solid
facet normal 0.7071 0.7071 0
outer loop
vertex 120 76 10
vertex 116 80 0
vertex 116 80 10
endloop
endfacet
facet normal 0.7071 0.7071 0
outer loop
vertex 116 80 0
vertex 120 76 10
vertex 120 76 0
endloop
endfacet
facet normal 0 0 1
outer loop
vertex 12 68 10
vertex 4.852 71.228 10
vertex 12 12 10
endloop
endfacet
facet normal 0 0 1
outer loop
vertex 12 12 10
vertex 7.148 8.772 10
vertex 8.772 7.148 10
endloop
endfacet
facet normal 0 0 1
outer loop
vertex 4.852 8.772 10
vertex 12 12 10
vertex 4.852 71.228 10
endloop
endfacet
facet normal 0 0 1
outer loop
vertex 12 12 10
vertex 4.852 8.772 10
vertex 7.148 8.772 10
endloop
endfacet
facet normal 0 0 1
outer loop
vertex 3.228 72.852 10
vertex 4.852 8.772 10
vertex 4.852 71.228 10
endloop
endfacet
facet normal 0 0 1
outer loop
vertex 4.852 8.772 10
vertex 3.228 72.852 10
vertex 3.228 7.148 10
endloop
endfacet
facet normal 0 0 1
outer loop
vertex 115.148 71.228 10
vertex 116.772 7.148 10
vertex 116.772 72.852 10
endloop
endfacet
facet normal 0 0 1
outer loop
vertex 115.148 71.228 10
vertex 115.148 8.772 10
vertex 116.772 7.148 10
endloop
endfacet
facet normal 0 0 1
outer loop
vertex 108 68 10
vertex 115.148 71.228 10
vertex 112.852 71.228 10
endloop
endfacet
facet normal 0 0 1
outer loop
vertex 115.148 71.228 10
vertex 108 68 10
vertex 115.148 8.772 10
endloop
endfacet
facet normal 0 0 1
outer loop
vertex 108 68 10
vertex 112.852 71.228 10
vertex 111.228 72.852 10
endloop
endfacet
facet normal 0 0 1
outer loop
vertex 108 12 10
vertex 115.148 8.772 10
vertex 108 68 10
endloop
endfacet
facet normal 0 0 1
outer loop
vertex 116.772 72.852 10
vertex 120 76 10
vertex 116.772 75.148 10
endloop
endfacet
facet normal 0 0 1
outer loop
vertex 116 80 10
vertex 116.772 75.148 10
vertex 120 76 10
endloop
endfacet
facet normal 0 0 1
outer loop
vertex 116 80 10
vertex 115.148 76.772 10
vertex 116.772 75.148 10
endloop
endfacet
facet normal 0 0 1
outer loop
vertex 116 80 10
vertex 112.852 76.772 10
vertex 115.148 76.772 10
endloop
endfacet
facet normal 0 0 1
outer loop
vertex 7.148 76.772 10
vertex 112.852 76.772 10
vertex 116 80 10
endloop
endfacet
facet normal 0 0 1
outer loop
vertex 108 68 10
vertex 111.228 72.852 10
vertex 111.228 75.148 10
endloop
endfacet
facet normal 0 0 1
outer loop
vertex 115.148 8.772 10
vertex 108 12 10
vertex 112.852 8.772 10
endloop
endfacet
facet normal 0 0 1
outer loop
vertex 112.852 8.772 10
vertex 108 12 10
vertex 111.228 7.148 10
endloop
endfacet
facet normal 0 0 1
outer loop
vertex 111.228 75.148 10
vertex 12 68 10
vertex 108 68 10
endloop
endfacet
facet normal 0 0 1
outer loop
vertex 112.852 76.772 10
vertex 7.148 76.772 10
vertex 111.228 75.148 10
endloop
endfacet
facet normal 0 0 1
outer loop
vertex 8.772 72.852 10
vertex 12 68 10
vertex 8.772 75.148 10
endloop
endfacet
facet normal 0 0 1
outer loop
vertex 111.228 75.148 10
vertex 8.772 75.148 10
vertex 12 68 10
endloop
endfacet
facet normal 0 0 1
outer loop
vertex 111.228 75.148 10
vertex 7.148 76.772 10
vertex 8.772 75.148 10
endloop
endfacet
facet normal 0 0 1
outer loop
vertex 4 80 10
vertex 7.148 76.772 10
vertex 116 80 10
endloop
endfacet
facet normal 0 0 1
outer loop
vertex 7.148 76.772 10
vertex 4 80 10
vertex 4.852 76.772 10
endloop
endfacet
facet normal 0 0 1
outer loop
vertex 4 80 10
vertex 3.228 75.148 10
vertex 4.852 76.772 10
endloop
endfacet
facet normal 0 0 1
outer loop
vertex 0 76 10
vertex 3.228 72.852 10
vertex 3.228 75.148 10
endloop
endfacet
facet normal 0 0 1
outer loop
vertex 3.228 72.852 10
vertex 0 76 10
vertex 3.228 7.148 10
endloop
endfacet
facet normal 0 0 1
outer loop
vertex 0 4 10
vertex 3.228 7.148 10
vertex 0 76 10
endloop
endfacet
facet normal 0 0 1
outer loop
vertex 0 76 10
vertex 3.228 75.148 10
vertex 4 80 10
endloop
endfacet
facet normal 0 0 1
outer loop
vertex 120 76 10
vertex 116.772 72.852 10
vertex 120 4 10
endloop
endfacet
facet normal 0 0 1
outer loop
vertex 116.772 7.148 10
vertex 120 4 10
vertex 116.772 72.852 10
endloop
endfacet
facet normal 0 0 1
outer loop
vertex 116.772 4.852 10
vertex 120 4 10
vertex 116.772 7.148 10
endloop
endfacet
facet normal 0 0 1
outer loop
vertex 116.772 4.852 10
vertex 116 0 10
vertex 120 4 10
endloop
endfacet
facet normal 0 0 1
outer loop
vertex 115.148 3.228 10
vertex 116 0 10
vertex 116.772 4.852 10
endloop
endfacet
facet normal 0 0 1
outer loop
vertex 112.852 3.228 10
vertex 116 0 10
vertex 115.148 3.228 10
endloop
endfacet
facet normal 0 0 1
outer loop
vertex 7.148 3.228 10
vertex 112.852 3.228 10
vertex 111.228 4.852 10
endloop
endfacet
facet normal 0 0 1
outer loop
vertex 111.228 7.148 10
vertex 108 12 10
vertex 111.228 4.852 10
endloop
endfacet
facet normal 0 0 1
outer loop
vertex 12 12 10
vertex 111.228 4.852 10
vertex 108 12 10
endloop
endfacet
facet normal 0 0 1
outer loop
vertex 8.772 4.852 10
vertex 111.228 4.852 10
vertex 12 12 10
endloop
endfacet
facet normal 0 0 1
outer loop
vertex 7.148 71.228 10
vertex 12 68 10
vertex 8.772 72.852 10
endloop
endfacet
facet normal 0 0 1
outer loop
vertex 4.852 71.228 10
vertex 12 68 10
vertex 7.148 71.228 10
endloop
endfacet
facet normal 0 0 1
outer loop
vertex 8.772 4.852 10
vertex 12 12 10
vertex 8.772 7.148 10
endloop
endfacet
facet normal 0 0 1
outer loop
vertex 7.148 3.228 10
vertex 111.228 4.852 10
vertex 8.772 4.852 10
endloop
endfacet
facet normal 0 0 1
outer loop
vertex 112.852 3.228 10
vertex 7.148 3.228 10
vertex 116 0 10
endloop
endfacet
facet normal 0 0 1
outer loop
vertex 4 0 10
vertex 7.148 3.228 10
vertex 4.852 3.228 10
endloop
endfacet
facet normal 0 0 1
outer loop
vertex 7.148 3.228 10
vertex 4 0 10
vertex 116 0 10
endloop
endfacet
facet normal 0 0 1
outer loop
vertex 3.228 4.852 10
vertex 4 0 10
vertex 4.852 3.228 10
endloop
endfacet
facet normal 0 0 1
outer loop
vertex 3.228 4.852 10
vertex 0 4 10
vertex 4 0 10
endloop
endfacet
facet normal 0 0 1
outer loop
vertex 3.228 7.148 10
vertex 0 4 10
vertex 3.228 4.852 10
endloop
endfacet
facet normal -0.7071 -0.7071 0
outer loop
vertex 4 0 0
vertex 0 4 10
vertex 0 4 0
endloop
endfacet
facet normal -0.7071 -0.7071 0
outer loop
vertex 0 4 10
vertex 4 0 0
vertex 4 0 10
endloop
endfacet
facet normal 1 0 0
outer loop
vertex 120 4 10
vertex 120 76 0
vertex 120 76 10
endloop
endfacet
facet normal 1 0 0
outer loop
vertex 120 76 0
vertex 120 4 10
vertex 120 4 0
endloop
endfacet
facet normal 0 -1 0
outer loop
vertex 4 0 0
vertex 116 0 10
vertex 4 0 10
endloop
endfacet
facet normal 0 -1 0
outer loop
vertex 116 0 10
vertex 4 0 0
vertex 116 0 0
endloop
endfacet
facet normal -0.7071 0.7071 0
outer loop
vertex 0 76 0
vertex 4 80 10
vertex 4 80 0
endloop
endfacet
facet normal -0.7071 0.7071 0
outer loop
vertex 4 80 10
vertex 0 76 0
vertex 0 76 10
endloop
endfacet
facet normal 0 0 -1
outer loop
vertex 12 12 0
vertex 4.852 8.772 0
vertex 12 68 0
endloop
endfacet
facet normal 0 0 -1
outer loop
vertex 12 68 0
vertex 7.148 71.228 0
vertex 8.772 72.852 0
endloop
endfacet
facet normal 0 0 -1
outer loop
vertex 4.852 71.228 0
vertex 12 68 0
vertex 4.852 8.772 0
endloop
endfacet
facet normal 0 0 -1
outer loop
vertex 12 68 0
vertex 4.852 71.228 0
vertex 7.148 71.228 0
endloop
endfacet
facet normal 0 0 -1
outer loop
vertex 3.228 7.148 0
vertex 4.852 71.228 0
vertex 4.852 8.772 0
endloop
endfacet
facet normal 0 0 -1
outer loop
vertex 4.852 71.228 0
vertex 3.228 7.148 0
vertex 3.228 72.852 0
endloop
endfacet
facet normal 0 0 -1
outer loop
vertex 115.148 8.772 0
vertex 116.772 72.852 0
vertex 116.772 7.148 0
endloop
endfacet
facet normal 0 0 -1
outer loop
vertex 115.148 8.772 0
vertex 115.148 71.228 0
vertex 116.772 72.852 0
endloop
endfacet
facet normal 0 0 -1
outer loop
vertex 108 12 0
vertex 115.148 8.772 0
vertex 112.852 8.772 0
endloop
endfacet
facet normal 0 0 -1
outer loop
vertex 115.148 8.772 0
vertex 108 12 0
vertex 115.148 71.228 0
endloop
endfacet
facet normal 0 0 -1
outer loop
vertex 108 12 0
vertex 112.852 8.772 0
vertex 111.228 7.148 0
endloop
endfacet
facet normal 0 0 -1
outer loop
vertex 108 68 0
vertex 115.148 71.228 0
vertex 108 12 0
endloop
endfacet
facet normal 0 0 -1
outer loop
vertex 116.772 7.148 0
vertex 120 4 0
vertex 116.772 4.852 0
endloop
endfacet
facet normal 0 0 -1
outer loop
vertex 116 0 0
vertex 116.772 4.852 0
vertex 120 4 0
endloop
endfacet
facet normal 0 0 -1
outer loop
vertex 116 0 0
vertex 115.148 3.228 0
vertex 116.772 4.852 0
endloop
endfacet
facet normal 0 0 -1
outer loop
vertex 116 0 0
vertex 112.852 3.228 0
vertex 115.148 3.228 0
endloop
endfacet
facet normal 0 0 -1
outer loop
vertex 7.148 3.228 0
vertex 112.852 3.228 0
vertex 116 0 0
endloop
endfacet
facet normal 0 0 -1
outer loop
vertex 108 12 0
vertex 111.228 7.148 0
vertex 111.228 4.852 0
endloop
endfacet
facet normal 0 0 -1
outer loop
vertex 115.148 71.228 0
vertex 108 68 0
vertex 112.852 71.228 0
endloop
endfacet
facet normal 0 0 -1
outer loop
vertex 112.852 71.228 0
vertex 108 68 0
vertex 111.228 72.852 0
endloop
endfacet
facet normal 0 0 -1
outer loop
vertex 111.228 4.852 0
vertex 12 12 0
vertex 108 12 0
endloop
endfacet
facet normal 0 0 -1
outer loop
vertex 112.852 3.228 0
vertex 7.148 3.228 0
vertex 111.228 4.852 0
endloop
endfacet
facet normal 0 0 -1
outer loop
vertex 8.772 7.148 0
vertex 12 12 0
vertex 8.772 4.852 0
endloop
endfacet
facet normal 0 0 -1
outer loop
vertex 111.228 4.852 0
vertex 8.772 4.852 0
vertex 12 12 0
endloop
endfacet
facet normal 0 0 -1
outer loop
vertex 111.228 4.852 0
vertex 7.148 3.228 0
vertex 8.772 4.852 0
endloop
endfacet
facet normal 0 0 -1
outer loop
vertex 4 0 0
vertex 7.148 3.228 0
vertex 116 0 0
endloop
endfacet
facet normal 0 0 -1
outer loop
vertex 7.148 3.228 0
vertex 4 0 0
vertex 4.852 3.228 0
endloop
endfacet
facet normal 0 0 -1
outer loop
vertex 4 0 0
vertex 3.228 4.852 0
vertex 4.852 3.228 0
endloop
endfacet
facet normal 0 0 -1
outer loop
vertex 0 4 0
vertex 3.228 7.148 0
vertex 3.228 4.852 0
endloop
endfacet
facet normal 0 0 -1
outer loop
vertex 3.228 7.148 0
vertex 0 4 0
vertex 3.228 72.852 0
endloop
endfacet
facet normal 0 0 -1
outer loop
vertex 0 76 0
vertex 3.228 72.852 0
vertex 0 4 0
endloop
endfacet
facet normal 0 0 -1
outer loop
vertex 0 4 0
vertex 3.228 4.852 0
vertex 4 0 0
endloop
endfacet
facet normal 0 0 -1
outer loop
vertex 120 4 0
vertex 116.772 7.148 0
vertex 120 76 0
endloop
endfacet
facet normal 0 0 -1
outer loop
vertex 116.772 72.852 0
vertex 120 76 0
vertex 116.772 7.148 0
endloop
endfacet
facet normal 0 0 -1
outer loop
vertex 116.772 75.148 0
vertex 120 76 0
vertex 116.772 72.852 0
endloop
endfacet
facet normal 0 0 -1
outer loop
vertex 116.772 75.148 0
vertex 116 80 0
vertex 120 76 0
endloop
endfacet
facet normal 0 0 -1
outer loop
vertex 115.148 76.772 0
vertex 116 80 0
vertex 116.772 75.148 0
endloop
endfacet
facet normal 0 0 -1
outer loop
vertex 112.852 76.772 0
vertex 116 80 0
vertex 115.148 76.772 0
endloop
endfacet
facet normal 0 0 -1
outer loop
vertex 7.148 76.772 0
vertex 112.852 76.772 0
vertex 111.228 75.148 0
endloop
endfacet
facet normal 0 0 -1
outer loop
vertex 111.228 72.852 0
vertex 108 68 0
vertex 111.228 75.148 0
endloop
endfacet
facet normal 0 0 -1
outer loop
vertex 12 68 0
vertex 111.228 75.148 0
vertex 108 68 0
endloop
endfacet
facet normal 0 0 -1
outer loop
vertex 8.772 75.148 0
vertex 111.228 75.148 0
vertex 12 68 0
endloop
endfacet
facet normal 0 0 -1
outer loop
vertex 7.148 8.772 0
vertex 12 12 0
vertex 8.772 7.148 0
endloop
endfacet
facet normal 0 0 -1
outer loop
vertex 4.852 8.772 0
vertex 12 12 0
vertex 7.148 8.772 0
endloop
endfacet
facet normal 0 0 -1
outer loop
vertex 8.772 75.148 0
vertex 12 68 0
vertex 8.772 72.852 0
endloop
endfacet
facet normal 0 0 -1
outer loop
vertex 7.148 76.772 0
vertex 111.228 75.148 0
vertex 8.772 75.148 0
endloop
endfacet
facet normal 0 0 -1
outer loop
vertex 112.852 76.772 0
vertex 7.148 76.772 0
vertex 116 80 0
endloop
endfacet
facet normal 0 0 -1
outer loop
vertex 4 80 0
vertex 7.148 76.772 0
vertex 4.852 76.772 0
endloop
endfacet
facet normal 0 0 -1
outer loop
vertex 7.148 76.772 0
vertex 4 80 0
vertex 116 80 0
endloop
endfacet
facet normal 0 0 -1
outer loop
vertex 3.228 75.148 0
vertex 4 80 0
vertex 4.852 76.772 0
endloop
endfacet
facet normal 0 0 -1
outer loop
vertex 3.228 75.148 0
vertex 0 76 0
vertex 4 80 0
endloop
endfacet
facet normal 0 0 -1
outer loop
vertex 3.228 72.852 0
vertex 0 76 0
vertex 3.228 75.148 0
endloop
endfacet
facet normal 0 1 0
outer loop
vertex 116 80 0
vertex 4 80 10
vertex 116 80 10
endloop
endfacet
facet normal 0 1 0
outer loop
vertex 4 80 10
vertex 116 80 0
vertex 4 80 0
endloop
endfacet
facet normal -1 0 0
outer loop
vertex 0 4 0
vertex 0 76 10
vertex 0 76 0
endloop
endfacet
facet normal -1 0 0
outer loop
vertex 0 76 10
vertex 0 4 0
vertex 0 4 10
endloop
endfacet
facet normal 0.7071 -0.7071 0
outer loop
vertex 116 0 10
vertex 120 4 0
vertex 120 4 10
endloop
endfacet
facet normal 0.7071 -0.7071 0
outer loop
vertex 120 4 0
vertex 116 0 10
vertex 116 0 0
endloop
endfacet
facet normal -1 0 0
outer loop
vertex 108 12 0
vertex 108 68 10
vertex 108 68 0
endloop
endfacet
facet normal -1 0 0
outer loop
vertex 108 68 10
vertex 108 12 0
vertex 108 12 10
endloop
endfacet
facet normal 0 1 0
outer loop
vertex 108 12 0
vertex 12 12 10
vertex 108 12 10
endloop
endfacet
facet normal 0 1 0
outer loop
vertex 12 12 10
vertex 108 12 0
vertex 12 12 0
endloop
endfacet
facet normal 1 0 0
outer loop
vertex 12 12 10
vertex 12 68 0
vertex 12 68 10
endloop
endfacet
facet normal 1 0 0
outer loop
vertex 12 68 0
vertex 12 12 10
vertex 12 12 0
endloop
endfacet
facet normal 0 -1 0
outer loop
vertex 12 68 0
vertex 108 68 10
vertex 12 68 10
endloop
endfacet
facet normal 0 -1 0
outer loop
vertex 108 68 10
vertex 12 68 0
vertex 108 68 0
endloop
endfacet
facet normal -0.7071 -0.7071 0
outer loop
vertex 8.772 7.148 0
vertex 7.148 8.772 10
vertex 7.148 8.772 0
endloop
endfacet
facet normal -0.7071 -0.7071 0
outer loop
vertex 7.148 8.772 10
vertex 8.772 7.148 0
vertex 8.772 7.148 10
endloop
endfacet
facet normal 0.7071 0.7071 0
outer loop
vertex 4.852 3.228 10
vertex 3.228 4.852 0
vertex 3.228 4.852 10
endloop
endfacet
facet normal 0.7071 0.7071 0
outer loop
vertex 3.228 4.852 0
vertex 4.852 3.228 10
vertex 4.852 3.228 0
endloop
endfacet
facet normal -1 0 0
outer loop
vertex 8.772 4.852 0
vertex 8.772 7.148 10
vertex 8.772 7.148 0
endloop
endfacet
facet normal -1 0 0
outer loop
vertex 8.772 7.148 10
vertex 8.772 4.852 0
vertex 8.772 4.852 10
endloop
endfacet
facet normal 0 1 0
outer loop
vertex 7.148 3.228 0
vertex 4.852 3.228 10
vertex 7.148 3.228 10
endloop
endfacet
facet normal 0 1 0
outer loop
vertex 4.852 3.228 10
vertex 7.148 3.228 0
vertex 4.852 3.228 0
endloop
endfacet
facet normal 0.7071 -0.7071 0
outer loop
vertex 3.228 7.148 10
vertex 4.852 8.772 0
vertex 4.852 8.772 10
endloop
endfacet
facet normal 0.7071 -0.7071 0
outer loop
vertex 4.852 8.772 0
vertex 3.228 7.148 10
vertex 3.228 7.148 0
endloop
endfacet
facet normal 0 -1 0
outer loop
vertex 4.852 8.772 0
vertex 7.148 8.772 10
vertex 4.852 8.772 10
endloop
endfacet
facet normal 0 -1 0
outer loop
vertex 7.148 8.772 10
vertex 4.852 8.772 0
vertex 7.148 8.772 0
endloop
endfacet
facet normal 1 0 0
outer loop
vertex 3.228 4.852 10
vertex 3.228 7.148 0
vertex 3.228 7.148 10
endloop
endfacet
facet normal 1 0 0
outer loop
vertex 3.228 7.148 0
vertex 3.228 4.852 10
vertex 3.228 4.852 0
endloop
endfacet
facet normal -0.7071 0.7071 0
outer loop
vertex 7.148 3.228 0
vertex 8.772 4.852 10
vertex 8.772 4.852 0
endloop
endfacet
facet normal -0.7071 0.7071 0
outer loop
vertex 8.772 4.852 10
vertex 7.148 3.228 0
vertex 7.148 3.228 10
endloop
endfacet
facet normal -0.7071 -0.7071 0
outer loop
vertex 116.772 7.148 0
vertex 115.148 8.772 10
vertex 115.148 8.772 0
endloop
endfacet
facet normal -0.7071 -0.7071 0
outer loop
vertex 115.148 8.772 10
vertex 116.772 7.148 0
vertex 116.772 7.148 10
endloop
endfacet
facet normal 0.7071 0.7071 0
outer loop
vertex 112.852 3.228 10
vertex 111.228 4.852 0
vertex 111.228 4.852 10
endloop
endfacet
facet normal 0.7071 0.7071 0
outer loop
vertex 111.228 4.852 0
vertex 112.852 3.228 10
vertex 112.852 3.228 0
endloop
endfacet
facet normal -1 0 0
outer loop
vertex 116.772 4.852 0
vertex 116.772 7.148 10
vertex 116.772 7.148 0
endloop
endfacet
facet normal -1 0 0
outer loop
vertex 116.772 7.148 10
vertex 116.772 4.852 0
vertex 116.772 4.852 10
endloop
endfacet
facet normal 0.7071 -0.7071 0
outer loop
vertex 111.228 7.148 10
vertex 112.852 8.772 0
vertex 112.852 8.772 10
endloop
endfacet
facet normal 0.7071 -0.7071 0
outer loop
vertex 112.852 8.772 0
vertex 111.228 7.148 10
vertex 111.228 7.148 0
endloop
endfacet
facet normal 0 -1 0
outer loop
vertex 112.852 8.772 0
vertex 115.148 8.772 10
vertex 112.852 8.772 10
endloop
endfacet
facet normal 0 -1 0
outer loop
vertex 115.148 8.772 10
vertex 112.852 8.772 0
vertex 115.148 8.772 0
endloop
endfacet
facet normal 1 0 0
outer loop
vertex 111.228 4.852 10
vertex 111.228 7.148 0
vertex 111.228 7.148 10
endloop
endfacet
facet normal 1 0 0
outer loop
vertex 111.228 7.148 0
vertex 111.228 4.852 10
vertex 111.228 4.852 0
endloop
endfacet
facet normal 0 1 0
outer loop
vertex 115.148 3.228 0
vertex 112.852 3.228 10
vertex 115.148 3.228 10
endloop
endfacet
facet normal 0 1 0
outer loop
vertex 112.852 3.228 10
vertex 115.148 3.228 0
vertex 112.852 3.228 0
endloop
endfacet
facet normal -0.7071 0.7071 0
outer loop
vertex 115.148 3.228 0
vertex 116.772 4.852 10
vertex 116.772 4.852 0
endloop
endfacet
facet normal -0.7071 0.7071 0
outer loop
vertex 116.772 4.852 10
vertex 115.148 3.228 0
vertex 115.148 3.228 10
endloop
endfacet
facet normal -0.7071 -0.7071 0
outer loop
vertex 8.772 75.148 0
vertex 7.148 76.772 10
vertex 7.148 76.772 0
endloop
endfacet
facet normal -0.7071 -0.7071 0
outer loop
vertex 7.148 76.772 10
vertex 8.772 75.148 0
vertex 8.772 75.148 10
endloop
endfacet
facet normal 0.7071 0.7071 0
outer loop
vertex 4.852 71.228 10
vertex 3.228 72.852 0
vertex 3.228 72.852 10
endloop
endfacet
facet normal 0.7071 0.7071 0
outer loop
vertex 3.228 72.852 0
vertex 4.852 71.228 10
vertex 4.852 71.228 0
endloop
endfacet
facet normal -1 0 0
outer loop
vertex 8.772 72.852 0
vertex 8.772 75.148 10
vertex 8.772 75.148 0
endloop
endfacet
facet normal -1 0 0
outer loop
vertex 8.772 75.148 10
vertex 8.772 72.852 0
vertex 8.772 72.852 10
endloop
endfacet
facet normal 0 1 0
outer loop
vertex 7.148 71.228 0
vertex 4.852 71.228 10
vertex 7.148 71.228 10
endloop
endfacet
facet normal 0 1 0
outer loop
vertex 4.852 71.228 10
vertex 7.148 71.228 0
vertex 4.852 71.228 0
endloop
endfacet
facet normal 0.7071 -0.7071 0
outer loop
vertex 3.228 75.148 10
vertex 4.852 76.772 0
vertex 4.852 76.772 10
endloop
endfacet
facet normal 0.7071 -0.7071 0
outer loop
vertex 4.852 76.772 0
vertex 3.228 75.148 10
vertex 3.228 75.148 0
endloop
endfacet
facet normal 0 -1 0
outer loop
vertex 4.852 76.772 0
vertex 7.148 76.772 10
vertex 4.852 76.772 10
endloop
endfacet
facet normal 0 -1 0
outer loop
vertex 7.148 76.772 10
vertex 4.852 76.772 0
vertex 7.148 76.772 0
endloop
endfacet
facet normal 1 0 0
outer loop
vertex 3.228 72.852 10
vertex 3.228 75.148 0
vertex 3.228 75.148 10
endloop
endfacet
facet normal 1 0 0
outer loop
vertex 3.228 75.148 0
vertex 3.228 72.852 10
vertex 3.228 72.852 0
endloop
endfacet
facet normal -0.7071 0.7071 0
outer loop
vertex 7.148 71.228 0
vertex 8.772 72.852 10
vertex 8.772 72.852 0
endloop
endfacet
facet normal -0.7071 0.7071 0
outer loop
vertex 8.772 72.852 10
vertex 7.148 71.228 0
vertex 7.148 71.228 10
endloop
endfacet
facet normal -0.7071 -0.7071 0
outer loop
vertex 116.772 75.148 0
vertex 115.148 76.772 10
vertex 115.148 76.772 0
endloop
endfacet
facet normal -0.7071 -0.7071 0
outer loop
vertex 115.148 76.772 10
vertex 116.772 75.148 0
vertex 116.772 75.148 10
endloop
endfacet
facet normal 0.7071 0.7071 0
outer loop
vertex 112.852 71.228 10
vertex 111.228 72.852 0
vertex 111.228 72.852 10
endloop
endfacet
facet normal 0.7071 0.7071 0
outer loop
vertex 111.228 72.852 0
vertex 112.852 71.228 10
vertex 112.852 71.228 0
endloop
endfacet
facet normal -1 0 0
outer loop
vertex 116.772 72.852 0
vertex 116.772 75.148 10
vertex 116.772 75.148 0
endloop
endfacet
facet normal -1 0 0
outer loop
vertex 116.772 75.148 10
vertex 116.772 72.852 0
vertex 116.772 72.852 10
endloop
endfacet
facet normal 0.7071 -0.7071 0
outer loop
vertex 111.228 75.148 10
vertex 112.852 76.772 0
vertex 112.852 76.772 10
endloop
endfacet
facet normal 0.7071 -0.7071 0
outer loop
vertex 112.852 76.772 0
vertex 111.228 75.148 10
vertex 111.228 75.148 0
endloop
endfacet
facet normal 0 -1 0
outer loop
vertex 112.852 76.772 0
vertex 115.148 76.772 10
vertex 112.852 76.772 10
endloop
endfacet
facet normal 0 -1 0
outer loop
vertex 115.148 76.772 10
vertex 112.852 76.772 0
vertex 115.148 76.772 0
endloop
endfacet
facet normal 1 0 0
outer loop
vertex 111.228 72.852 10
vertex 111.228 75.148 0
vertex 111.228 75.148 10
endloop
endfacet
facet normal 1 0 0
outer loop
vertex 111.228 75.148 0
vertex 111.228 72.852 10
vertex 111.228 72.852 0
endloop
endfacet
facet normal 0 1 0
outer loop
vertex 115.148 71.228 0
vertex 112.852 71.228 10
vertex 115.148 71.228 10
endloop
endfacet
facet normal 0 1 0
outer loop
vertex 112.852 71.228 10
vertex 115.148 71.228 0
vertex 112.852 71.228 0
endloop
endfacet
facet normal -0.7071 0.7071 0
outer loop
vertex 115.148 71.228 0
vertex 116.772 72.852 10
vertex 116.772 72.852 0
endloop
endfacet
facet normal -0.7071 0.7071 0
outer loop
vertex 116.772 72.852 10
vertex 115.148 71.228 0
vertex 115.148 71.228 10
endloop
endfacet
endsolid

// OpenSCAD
$fn = 32;

// ----------------------------------------------------------------------
// Frame plate: 120 x 80 frame, 12 mm rails
// ----------------------------------------------------------------------

// --- parameters (mm) ---
plate_l = 120;            // plate length, X
plate_w = 80;             // plate width, Y
plate_t = 10;             // plate thickness, Z (extrusion height)
corner_c = 4;             // corner chamfer
frame_bar = 12;           // frame rail width
bolt_r = 3;               // corner bolt window radius
bolt_inset = 6;           // bolt centre inset from the edges

win_l = plate_l - 2 * frame_bar;  // window length
win_w = plate_w - 2 * frame_bar;  // window width
bolt_d = 2 * bolt_r;  // corner hole diameter

profile = [[4, 0], [116, 0], [120, 4], [120, 76], [116, 80], [4, 80], [0, 76], [0, 4]];  // primary outline, 8 points, counter clockwise
void_1 = [[12, 12], [108, 12], [108, 68], [12, 68]];  // the window, 4 points
void_2 = [[8.772, 7.148], [7.148, 8.772], [4.852, 8.772], [3.228, 7.148], [3.228, 4.852], [4.852, 3.228], [7.148, 3.228], [8.772, 4.852]];  // corner bolt window, 8 points
void_3 = [[116.772, 7.148], [115.148, 8.772], [112.852, 8.772], [111.228, 7.148], [111.228, 4.852], [112.852, 3.228], [115.148, 3.228], [116.772, 4.852]];  // corner bolt window, 8 points
void_4 = [[8.772, 75.148], [7.148, 76.772], [4.852, 76.772], [3.228, 75.148], [3.228, 72.852], [4.852, 71.228], [7.148, 71.228], [8.772, 72.852]];  // corner bolt window, 8 points
void_5 = [[116.772, 75.148], [115.148, 76.772], [112.852, 76.772], [111.228, 75.148], [111.228, 72.852], [112.852, 71.228], [115.148, 71.228], [116.772, 72.852]];  // corner bolt window, 8 points

// --- the one profile operation ---
difference() {
  linear_extrude(height = plate_t) polygon(points = profile);
  translate([0, 0, -1])
    linear_extrude(height = plate_t + 2) polygon(points = void_1);
  translate([0, 0, -1])
    linear_extrude(height = plate_t + 2) polygon(points = void_2);
  translate([0, 0, -1])
    linear_extrude(height = plate_t + 2) polygon(points = void_3);
  translate([0, 0, -1])
    linear_extrude(height = plate_t + 2) polygon(points = void_4);
  translate([0, 0, -1])
    linear_extrude(height = plate_t + 2) polygon(points = void_5);
}
